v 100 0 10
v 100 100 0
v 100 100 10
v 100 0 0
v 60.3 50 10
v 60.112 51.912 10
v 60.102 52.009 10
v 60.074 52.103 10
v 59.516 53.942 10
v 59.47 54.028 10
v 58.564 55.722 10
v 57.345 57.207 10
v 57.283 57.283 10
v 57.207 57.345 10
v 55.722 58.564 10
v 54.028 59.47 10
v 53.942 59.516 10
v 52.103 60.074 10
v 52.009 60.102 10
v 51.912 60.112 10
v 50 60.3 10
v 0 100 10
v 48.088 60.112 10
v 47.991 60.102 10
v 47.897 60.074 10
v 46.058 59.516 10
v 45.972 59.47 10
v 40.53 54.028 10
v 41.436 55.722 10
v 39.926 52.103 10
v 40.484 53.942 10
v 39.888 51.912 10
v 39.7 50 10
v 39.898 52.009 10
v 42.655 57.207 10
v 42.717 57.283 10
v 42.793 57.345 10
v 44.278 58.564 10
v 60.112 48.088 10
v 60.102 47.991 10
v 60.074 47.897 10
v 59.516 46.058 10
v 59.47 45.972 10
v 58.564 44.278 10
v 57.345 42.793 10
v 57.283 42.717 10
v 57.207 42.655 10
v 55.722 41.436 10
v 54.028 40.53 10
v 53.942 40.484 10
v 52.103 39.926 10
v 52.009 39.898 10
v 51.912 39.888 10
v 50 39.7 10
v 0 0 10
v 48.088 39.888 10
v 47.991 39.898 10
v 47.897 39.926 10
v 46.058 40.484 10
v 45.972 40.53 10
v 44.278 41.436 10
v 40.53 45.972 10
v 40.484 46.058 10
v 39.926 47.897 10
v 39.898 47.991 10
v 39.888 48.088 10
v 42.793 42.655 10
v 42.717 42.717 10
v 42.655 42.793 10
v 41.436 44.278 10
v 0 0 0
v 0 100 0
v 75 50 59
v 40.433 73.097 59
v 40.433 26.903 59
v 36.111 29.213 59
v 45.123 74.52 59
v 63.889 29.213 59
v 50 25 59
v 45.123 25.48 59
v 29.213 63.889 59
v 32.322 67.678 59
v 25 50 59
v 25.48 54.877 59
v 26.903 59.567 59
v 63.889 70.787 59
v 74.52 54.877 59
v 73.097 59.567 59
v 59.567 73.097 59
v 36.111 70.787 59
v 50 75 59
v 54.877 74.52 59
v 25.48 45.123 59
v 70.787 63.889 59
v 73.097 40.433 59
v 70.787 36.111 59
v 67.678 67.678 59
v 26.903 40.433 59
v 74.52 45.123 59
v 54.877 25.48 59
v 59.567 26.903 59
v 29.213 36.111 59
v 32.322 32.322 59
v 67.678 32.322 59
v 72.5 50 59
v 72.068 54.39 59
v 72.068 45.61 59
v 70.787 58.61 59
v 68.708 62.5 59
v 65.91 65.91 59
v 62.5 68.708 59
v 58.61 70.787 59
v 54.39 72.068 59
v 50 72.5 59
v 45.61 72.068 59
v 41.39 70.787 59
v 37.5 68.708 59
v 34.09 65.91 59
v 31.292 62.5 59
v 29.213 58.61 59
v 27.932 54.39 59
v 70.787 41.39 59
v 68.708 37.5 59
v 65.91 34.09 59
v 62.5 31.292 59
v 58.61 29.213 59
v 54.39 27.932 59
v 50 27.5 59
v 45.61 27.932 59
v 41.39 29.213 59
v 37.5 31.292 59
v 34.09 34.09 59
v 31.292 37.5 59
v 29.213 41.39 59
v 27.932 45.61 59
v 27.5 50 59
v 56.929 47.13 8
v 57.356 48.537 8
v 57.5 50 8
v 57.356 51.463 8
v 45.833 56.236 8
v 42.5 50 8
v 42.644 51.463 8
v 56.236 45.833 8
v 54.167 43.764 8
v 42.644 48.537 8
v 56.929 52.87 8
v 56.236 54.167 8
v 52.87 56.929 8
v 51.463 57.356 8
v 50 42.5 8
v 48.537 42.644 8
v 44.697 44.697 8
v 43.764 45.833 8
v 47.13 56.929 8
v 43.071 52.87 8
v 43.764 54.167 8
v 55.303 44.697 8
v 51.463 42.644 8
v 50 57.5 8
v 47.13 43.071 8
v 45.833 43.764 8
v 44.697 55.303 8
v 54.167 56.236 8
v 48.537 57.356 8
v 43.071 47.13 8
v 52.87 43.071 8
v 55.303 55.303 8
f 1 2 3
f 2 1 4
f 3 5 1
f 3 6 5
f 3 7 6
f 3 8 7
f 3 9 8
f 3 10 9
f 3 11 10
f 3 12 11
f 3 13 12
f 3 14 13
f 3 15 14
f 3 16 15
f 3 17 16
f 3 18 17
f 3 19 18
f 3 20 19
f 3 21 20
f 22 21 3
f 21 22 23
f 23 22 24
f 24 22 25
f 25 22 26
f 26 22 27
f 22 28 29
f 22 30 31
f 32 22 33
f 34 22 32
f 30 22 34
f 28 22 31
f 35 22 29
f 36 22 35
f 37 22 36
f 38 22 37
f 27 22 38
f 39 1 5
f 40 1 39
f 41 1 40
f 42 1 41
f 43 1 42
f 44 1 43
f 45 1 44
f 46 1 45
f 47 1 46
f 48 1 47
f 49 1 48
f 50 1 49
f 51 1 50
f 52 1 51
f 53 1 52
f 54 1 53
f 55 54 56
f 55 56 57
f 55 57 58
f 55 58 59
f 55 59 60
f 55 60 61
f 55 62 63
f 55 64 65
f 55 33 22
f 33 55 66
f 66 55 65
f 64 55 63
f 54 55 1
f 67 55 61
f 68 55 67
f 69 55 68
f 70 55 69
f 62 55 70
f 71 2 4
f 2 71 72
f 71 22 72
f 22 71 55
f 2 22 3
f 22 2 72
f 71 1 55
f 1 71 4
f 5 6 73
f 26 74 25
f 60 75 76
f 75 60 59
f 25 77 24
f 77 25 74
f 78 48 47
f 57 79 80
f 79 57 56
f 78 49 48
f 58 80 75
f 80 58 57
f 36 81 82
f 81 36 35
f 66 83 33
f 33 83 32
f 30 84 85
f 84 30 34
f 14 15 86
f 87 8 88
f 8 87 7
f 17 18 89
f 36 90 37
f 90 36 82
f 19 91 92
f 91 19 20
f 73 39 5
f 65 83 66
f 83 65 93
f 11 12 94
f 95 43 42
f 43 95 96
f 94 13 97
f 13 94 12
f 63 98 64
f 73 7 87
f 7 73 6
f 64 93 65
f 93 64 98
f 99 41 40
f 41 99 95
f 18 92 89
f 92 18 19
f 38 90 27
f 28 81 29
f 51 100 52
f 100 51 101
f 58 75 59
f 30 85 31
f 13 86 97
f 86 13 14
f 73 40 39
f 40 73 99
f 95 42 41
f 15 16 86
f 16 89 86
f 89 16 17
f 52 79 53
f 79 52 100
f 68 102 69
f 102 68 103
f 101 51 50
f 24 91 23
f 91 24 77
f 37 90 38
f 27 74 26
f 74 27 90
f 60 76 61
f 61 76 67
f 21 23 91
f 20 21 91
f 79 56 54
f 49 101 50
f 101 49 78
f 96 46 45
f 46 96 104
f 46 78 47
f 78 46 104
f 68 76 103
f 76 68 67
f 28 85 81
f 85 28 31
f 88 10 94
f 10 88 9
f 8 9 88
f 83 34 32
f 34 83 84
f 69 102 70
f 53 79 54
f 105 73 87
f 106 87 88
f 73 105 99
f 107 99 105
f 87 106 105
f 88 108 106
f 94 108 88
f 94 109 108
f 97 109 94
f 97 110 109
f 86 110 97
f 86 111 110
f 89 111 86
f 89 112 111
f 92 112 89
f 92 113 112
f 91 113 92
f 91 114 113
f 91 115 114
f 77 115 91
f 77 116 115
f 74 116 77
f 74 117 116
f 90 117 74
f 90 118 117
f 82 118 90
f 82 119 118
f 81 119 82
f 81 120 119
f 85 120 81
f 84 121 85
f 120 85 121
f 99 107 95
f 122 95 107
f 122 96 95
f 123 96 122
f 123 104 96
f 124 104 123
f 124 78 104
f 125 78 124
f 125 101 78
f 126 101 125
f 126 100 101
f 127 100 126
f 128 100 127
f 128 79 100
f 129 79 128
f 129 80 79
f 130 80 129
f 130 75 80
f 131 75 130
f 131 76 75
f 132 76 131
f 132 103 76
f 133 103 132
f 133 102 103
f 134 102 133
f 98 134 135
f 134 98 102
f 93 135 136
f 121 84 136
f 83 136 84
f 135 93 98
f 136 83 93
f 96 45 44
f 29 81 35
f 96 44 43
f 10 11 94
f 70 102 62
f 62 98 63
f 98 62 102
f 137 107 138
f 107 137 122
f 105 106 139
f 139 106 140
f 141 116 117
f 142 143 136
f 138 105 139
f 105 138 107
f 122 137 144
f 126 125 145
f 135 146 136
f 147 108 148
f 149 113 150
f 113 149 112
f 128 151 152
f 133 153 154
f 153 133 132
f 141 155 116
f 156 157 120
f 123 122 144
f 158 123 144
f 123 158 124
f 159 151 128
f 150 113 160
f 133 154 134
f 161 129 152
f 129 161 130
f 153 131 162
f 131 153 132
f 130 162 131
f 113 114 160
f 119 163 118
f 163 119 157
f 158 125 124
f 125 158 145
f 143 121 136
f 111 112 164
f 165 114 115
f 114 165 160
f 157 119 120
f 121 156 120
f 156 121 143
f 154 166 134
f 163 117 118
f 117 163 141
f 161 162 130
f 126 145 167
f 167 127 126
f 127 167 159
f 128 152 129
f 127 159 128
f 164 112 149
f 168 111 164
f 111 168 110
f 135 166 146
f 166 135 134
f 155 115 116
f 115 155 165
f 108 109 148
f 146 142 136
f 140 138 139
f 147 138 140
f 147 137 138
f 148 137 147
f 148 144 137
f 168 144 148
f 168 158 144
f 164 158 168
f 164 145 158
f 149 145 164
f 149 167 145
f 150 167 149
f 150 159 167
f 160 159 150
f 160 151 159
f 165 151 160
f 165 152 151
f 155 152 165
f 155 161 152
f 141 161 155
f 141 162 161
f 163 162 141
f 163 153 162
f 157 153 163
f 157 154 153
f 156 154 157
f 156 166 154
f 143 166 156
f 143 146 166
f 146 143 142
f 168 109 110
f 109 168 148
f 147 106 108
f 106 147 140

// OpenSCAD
$fn = 32;

// ----------------------------------------------------------------------
// Hopper: funnel with square flange
// ----------------------------------------------------------------------

// --- parameters (mm) ---
fl = 100;                 // flange side, X and Y
fl_t = 10;                // flange thickness
cone_h = 50;              // cone height above the flange
top_d = 50;               // cone mouth diameter
bot_d = 20;               // cone spout diameter
wall = 2.5;               // cone wall thickness
fit_tol = 0.05;           // tolerance for press fits, mm
free_tol = 0.3;           // tolerance for clearance fits, mm

bore_d = bot_d - 2 * wall;  // spout bore diameter
total_h = fl_t + cone_h - 1;  // overall height

difference() {
  union() {
    cube([fl, fl, fl_t]);
    translate([fl / 2, fl / 2, fl_t - 1])
      cylinder(h = cone_h, d1 = bot_d, d2 = top_d);
  }
  translate([fl / 2, fl / 2, fl_t - 2])
    cylinder(h = cone_h + 1, d1 = bore_d, d2 = top_d - 2 * wall);
}
